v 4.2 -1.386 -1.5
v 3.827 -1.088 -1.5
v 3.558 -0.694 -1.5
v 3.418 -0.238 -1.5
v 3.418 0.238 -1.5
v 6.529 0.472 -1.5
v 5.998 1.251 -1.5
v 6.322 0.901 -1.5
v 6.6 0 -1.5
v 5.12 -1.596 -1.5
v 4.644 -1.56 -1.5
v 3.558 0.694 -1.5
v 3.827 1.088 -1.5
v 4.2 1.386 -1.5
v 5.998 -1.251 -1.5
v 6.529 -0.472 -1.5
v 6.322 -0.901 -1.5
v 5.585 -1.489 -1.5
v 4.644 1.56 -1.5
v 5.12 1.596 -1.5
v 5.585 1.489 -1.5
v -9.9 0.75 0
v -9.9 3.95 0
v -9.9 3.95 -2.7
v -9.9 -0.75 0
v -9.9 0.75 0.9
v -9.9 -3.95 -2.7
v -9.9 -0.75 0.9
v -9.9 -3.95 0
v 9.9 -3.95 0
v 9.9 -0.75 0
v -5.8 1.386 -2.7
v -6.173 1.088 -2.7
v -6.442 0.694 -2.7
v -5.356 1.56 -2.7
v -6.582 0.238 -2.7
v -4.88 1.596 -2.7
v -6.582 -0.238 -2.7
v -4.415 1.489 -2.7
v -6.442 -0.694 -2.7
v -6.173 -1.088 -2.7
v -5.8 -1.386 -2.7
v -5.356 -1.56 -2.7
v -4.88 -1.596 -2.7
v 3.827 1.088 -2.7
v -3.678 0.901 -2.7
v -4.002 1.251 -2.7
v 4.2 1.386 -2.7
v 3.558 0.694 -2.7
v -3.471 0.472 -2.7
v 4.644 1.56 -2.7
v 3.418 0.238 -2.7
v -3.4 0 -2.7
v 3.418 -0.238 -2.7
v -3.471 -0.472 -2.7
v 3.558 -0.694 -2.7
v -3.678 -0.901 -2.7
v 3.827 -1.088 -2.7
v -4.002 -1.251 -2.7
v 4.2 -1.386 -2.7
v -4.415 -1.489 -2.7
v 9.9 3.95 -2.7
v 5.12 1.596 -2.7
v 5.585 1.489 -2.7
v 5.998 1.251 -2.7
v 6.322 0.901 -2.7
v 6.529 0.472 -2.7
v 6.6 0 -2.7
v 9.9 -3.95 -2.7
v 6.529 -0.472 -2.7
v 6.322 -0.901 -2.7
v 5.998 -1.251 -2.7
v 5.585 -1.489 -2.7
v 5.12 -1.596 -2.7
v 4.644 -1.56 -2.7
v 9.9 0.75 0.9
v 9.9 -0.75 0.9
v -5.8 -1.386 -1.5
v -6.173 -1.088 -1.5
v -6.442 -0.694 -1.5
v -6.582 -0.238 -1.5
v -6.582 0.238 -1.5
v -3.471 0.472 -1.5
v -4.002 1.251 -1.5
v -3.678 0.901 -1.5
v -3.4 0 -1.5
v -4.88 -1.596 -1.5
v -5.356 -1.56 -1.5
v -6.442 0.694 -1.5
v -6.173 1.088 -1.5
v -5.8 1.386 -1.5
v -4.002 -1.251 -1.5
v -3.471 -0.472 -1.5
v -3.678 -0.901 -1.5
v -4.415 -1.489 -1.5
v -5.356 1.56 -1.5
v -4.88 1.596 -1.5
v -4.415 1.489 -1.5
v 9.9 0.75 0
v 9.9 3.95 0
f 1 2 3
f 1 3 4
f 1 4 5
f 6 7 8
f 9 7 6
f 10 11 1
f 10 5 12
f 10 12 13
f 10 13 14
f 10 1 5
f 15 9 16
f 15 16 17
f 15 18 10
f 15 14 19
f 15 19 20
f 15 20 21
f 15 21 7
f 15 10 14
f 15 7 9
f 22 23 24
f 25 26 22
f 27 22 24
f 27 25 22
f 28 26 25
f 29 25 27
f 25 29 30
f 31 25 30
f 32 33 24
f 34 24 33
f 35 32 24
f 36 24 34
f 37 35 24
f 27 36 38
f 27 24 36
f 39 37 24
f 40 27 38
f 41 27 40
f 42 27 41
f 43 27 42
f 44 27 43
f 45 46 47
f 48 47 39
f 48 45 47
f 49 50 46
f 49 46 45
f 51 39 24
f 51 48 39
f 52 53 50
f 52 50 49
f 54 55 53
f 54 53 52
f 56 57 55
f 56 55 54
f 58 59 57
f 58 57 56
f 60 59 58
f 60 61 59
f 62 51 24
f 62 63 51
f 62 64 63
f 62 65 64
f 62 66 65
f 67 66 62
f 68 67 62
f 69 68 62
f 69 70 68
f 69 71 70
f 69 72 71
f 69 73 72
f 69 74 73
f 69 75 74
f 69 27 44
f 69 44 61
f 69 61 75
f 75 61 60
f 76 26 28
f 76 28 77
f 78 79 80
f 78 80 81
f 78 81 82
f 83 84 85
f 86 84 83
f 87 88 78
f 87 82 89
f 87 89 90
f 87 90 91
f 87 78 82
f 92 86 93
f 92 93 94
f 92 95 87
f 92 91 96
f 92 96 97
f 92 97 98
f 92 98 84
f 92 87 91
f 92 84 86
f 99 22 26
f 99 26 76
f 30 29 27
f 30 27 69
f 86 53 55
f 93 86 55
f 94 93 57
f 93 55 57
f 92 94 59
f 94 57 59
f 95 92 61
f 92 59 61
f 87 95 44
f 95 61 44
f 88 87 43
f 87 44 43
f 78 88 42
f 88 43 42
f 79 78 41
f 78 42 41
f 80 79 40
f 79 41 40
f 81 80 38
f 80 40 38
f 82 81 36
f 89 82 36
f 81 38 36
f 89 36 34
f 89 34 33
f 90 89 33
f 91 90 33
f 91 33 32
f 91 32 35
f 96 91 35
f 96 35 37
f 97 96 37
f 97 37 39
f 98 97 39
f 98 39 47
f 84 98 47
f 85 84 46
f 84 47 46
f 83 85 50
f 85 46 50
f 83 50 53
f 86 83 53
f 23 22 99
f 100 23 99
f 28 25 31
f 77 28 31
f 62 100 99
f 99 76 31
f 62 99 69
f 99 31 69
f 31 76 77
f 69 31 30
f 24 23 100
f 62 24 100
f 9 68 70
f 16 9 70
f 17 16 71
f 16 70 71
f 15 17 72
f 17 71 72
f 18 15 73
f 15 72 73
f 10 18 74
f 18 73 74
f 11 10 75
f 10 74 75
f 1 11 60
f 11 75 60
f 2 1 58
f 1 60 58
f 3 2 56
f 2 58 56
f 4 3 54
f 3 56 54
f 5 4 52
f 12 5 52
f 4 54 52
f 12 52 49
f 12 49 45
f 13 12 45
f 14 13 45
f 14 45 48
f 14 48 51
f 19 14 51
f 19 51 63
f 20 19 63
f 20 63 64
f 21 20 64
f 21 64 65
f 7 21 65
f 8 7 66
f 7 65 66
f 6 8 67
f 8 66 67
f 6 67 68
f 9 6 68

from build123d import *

# Parameters (mm, degrees)
F0_W     = 19.8
F0_H     = 1.5
F1_DEPTH = 0.9
F2_W     = 19.8
F2_H     = 7.9
F3_DEPTH = 2.7
F4_R     = 1.6
F5_DEPTH = 1.2


with BuildPart() as f1:
    # F0 (on Top) → F1 (new body)
    with BuildSketch(Plane.XY):
        Rectangle(F0_W, F0_H)
    extrude(amount=F1_DEPTH)

    # F2 (on face) → F3 (join)
    with BuildSketch(Plane(origin=(0, 0, 0), x_dir=(1, 0, 0), z_dir=(0, 0, -1))):
        Rectangle(F2_W, F2_H)
    extrude(amount=F3_DEPTH)

    # F4 (on face) → F5 (cut)
    with BuildSketch(Plane(origin=(0, 0, -2.7), x_dir=(1, 0, 0), z_dir=(0, 0, -1))):
        with Locations((-5, 0)):
            Circle(F4_R)
        with Locations((5, 0)):
            Circle(F4_R)
    extrude(amount=-F5_DEPTH, mode=Mode.SUBTRACT)


solid = f1.part
